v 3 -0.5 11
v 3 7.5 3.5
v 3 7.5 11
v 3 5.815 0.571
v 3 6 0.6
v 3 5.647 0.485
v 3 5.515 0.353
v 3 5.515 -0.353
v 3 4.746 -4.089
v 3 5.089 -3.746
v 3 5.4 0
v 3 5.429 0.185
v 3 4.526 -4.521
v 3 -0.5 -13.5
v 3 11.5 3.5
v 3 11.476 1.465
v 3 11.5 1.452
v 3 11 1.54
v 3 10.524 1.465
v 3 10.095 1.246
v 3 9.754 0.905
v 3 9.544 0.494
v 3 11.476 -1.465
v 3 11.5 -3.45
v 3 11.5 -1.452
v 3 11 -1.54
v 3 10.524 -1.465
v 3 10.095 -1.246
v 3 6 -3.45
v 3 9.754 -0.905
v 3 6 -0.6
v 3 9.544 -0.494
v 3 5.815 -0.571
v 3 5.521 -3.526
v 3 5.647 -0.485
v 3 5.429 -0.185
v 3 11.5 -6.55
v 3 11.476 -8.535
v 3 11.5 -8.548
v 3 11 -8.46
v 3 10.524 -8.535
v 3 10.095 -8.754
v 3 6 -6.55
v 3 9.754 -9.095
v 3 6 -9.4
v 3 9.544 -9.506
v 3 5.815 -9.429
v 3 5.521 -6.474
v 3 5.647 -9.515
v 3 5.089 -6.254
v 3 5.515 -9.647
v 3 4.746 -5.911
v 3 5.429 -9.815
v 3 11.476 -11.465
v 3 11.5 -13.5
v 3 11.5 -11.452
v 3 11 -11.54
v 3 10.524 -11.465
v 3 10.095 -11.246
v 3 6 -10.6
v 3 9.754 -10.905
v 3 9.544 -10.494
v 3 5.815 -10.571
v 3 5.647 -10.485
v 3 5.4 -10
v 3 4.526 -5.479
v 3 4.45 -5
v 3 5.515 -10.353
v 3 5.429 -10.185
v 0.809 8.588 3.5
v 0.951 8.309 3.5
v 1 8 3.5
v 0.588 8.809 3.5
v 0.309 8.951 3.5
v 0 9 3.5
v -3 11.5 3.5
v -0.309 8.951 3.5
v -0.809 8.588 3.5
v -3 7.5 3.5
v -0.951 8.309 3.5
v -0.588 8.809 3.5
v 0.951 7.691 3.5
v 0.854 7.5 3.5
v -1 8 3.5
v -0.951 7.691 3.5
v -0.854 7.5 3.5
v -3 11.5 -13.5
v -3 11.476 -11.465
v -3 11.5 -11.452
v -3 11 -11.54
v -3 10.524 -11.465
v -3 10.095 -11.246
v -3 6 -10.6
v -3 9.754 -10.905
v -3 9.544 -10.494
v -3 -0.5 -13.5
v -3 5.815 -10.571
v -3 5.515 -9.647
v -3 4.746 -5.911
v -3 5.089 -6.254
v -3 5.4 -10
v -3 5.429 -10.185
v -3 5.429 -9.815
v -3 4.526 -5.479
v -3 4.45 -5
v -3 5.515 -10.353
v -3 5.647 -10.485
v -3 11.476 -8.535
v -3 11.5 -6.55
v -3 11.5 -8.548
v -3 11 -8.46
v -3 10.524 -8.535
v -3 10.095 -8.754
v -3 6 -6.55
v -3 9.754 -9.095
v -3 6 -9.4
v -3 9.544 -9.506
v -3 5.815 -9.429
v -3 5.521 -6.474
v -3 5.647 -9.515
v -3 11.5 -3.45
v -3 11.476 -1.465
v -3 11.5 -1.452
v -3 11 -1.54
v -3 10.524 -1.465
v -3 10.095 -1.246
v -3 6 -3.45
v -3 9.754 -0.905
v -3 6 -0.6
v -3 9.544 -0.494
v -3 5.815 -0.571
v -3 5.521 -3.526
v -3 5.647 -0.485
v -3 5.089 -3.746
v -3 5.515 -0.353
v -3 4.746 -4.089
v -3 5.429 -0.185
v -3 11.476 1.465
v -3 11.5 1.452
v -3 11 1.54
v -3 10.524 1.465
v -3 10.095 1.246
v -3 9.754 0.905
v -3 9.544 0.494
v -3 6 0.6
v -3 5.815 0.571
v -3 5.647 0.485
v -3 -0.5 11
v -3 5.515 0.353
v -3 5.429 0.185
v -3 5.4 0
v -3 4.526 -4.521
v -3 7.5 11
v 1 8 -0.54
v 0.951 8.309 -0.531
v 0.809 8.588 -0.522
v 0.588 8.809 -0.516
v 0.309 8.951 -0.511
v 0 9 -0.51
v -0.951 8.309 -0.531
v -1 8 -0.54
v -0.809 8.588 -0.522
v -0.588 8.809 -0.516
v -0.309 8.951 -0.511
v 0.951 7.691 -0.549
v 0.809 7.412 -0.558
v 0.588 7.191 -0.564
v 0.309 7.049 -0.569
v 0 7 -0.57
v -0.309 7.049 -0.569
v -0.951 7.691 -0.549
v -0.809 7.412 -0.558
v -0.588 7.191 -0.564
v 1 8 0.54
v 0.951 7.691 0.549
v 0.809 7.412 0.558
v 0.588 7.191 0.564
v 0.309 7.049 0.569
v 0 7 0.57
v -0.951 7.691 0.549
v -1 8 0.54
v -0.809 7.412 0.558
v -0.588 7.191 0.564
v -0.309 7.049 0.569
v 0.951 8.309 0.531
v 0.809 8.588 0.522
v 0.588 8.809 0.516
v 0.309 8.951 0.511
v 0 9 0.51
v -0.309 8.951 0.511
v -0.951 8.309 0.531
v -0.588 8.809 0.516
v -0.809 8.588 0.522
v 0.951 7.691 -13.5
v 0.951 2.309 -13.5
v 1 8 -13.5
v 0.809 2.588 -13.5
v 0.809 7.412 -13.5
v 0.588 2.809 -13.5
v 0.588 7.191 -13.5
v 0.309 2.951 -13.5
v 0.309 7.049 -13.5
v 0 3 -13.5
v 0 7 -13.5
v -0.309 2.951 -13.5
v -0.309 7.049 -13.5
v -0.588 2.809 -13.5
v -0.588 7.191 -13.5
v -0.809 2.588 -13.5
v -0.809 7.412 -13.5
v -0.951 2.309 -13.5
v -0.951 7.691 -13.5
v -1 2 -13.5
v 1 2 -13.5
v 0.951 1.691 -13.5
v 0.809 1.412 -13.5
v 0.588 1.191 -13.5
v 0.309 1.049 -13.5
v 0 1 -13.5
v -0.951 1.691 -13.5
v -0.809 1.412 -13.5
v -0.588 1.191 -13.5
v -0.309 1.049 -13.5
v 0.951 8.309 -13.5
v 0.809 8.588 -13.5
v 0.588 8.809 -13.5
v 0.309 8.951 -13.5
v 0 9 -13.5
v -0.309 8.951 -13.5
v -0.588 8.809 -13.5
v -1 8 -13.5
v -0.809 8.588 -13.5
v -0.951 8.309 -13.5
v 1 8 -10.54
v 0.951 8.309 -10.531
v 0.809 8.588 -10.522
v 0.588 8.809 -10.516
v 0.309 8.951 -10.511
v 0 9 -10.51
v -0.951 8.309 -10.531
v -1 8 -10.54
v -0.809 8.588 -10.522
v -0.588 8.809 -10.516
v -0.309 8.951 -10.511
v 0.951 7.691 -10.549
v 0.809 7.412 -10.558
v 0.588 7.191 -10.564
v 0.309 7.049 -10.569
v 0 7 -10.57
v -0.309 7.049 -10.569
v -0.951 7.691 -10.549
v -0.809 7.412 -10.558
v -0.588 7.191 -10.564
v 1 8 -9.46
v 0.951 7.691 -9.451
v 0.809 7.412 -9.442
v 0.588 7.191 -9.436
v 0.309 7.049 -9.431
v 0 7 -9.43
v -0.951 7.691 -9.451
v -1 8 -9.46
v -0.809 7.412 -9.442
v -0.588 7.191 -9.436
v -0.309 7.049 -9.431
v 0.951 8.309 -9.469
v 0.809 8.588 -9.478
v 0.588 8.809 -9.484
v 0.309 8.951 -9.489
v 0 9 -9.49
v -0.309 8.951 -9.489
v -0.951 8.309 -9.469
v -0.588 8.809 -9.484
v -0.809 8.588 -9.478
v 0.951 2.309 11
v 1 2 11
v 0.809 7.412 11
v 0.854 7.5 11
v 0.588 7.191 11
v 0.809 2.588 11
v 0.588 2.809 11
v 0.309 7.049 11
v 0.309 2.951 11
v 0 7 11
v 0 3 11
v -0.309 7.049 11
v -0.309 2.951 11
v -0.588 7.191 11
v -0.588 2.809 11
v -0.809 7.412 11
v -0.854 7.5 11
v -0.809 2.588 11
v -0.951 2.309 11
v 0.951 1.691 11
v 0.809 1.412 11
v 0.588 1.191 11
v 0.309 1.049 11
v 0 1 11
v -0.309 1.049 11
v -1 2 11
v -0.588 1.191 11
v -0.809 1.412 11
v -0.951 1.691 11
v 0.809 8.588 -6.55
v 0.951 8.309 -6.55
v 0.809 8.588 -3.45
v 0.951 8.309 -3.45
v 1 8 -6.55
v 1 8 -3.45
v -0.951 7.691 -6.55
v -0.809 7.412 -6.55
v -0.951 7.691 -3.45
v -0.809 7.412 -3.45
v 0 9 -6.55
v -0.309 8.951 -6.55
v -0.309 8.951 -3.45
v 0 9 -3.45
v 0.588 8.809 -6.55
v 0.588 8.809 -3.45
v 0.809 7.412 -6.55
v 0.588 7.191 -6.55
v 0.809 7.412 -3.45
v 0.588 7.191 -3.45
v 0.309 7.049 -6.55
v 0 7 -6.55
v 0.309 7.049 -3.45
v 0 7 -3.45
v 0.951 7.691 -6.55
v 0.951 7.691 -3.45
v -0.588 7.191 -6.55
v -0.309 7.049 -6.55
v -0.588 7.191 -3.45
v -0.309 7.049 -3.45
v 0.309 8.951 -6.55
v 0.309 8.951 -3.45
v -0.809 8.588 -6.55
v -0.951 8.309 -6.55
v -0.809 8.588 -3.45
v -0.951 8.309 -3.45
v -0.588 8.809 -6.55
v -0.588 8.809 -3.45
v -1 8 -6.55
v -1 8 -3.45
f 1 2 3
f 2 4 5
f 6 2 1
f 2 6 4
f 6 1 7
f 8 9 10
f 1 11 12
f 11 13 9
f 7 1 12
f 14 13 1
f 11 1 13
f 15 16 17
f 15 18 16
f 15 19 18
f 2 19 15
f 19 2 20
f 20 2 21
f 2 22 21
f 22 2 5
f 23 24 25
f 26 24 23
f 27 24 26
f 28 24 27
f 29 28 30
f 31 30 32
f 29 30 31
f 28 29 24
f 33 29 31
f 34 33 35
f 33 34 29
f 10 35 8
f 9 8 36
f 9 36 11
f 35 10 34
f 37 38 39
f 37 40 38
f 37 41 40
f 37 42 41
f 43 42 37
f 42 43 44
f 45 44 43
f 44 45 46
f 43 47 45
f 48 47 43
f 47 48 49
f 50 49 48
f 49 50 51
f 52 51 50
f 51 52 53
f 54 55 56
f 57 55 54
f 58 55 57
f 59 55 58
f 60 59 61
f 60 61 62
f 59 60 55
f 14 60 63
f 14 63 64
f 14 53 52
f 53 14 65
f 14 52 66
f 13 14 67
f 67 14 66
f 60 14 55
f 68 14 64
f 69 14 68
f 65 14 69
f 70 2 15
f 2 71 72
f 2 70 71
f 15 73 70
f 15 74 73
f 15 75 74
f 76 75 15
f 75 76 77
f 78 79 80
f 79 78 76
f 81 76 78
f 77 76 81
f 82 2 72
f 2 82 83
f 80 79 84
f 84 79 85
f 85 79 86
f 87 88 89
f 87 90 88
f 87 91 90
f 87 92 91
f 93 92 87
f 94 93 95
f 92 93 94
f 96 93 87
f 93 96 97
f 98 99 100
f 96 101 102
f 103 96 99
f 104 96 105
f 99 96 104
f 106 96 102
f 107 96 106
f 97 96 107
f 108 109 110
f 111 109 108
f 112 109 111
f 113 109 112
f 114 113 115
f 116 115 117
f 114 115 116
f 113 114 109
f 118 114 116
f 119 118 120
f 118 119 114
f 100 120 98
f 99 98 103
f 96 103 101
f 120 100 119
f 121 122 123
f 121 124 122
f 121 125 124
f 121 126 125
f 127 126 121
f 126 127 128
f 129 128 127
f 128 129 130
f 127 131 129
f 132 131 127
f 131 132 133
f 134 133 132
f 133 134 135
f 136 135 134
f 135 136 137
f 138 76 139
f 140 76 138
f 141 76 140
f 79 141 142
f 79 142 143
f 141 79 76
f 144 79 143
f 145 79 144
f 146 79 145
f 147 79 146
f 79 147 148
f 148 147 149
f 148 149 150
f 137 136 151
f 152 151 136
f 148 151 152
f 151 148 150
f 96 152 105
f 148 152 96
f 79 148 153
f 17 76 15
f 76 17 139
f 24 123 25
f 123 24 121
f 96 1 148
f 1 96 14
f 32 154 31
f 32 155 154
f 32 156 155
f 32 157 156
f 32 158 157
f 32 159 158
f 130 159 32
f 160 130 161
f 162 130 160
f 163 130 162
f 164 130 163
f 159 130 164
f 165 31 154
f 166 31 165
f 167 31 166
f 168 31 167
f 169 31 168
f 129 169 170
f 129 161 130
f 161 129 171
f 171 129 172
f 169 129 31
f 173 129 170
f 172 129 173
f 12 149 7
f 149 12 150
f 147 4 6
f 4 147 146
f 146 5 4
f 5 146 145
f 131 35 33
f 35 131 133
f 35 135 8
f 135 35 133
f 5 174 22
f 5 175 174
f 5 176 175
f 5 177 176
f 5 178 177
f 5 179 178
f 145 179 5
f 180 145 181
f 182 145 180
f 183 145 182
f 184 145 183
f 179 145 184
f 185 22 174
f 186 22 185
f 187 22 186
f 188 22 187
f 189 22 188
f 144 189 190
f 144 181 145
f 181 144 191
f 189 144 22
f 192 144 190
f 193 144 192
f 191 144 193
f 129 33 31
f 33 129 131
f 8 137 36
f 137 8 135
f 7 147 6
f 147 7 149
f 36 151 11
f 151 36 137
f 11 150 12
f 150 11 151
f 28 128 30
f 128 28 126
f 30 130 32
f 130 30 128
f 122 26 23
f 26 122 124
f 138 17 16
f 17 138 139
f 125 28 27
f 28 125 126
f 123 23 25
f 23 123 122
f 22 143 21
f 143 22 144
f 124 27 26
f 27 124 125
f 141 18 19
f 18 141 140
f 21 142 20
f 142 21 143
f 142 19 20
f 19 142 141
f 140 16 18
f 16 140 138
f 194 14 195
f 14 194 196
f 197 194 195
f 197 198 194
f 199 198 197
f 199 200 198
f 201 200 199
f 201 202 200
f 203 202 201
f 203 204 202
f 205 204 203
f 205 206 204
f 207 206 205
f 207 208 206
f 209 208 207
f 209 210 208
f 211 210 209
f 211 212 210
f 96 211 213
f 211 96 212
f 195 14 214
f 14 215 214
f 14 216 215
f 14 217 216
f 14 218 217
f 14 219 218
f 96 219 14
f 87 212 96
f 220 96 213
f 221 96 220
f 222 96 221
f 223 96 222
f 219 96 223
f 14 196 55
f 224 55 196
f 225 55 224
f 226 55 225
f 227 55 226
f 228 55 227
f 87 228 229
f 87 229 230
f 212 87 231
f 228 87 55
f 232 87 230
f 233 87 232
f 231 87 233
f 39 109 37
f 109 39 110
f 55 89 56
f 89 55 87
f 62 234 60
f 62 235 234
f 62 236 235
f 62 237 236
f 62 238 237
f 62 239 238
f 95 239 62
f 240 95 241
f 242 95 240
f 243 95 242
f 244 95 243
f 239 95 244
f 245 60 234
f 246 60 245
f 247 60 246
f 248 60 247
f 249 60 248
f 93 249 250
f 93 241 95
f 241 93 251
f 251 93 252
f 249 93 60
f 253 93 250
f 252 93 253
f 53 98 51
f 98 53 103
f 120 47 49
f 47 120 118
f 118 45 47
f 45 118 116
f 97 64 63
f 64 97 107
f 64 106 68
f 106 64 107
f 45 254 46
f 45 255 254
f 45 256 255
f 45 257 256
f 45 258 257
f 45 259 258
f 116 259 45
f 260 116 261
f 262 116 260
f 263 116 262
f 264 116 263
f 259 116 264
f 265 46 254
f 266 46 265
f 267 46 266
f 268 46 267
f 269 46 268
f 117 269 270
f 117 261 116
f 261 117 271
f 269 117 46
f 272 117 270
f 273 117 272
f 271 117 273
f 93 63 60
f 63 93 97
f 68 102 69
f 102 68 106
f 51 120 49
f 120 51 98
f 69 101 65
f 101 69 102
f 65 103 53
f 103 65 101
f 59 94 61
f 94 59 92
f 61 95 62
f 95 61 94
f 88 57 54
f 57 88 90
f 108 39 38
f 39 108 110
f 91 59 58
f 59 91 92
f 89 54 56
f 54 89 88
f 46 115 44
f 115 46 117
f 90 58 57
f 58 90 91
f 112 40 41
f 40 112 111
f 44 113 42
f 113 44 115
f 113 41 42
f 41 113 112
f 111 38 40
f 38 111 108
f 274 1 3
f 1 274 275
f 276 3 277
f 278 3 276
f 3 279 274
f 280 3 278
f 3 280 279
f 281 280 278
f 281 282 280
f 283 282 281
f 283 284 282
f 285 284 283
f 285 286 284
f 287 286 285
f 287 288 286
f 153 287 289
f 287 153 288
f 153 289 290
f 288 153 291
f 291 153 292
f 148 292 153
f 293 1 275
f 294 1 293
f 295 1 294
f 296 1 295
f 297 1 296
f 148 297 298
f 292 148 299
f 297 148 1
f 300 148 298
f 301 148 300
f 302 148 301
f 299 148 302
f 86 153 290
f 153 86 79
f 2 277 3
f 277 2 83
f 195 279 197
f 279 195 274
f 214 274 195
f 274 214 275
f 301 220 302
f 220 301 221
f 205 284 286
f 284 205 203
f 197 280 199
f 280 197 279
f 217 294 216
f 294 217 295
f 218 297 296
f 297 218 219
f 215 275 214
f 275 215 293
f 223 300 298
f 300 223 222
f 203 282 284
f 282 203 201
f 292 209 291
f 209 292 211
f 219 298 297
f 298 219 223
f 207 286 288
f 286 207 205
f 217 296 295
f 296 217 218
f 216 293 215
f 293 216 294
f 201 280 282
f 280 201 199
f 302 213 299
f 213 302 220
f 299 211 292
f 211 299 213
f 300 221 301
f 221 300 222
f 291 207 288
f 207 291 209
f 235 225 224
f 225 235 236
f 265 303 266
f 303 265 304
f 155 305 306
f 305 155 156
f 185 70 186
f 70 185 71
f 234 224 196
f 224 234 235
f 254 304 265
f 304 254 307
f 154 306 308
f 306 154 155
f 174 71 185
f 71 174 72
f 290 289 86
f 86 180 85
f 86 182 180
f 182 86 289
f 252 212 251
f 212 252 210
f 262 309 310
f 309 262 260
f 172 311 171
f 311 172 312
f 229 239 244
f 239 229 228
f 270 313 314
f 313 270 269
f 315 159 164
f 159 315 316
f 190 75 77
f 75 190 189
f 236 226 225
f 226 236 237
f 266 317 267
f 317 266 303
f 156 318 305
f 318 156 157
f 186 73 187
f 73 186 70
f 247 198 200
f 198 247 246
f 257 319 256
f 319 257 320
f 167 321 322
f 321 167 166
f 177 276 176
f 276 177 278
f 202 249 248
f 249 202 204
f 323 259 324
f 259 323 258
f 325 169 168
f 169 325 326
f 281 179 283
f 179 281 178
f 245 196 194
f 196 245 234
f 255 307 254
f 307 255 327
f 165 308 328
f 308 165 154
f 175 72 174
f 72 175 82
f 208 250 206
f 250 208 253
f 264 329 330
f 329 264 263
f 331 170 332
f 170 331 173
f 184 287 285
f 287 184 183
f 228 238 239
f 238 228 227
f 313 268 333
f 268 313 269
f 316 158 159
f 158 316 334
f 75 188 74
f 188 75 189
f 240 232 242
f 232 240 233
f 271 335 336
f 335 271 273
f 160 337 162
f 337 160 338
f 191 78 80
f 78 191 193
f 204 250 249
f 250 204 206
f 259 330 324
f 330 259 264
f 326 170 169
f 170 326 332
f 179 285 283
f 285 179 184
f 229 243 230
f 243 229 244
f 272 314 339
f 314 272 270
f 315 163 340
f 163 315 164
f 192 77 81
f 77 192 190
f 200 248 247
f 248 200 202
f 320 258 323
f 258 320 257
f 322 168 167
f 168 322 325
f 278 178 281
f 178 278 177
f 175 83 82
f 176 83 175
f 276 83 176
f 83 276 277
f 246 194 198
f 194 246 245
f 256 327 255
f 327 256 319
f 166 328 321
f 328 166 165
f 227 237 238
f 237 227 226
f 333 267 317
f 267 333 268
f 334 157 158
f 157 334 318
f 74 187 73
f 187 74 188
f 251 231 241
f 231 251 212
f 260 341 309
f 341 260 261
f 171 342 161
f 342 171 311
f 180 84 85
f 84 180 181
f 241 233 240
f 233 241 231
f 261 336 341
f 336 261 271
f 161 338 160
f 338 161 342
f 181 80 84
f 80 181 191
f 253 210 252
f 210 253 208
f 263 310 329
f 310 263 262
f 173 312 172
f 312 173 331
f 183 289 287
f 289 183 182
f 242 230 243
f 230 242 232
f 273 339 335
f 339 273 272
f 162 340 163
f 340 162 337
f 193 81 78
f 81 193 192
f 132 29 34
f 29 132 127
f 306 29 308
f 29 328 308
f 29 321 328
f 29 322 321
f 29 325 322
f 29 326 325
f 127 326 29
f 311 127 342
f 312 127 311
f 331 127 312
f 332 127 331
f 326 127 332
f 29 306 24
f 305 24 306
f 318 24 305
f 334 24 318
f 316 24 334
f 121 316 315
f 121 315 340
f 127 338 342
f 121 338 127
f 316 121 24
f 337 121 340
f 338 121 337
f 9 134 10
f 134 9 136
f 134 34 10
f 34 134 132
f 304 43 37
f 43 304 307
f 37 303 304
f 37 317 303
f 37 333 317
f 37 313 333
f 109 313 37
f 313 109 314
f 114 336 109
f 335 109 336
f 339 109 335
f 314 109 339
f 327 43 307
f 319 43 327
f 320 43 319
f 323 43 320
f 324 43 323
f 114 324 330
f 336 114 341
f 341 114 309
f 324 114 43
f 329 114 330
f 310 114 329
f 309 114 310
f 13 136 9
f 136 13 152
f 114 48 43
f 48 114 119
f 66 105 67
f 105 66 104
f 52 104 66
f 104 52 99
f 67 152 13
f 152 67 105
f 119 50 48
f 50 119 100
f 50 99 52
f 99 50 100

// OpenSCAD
DRIVEX = 1.6;
DRIVEY = 6;
DRIVEZ = 5.7;
SCREW = 2.1;
CABLE = 1.2;
ROD = 3.08;
DRIVE = 3.1;
$fn = 20;


module screw() {
    translate([-5, DRIVEY/2-1.5, -.5])
        rotate([0, 90, 0])
            cylinder(d = SCREW, h = 10);
}

module sleeve() {
    cube(center=true, [6, 11, 7]);
}

module cable() {
    hull() {
        translate([-8, 6]) 
            rotate([0, 90])
                cylinder(d=CABLE, h=20);
        translate([-8, 10]) 
            rotate([0, 90])
                cylinder(d=CABLE*.8, h=20);
    }
}

module retainer() {
    translate([0, 5.5])
        cube(center=true, [6,12,7]);
}

module pins() {
    translate([0, 2, -15])
        cylinder(d=2, h=30);
    translate([0, 8, -15])
        cylinder(d=2, h=30);
}

module rod() {
    translate([-8, 11]) 
        rotate([0, 90])
            cylinder(d=ROD, h=20);
}

module the_thing() {
    difference() {
        union() {
            //sleeve();
            retainer();
        }
        
        //#drive();
        //neg_misc();
        cable();
        rod();
    }
}

module for_the_limit() {
    translate([0,3.5,7])
        cube(center=true, [6,8,8]);
}

module bridge() {
    translate([0, 3,-9.5/2])
        cube(center=true, [6,7,7]);
}

module threaded_rod() {
    hull() {
        translate([-8, 12, -5])
            rotate([0, 90])
                cylinder(d=DRIVE, h=20);
        translate([-8, 6, -5])
            rotate([0, 90])
                cylinder(d=DRIVE, h=20);
    }
}

difference() {
    union() {
        the_thing();
        translate([0,0,-10])
            the_thing();
        bridge();
        for_the_limit();
    }
    threaded_rod();
    pins();
}
